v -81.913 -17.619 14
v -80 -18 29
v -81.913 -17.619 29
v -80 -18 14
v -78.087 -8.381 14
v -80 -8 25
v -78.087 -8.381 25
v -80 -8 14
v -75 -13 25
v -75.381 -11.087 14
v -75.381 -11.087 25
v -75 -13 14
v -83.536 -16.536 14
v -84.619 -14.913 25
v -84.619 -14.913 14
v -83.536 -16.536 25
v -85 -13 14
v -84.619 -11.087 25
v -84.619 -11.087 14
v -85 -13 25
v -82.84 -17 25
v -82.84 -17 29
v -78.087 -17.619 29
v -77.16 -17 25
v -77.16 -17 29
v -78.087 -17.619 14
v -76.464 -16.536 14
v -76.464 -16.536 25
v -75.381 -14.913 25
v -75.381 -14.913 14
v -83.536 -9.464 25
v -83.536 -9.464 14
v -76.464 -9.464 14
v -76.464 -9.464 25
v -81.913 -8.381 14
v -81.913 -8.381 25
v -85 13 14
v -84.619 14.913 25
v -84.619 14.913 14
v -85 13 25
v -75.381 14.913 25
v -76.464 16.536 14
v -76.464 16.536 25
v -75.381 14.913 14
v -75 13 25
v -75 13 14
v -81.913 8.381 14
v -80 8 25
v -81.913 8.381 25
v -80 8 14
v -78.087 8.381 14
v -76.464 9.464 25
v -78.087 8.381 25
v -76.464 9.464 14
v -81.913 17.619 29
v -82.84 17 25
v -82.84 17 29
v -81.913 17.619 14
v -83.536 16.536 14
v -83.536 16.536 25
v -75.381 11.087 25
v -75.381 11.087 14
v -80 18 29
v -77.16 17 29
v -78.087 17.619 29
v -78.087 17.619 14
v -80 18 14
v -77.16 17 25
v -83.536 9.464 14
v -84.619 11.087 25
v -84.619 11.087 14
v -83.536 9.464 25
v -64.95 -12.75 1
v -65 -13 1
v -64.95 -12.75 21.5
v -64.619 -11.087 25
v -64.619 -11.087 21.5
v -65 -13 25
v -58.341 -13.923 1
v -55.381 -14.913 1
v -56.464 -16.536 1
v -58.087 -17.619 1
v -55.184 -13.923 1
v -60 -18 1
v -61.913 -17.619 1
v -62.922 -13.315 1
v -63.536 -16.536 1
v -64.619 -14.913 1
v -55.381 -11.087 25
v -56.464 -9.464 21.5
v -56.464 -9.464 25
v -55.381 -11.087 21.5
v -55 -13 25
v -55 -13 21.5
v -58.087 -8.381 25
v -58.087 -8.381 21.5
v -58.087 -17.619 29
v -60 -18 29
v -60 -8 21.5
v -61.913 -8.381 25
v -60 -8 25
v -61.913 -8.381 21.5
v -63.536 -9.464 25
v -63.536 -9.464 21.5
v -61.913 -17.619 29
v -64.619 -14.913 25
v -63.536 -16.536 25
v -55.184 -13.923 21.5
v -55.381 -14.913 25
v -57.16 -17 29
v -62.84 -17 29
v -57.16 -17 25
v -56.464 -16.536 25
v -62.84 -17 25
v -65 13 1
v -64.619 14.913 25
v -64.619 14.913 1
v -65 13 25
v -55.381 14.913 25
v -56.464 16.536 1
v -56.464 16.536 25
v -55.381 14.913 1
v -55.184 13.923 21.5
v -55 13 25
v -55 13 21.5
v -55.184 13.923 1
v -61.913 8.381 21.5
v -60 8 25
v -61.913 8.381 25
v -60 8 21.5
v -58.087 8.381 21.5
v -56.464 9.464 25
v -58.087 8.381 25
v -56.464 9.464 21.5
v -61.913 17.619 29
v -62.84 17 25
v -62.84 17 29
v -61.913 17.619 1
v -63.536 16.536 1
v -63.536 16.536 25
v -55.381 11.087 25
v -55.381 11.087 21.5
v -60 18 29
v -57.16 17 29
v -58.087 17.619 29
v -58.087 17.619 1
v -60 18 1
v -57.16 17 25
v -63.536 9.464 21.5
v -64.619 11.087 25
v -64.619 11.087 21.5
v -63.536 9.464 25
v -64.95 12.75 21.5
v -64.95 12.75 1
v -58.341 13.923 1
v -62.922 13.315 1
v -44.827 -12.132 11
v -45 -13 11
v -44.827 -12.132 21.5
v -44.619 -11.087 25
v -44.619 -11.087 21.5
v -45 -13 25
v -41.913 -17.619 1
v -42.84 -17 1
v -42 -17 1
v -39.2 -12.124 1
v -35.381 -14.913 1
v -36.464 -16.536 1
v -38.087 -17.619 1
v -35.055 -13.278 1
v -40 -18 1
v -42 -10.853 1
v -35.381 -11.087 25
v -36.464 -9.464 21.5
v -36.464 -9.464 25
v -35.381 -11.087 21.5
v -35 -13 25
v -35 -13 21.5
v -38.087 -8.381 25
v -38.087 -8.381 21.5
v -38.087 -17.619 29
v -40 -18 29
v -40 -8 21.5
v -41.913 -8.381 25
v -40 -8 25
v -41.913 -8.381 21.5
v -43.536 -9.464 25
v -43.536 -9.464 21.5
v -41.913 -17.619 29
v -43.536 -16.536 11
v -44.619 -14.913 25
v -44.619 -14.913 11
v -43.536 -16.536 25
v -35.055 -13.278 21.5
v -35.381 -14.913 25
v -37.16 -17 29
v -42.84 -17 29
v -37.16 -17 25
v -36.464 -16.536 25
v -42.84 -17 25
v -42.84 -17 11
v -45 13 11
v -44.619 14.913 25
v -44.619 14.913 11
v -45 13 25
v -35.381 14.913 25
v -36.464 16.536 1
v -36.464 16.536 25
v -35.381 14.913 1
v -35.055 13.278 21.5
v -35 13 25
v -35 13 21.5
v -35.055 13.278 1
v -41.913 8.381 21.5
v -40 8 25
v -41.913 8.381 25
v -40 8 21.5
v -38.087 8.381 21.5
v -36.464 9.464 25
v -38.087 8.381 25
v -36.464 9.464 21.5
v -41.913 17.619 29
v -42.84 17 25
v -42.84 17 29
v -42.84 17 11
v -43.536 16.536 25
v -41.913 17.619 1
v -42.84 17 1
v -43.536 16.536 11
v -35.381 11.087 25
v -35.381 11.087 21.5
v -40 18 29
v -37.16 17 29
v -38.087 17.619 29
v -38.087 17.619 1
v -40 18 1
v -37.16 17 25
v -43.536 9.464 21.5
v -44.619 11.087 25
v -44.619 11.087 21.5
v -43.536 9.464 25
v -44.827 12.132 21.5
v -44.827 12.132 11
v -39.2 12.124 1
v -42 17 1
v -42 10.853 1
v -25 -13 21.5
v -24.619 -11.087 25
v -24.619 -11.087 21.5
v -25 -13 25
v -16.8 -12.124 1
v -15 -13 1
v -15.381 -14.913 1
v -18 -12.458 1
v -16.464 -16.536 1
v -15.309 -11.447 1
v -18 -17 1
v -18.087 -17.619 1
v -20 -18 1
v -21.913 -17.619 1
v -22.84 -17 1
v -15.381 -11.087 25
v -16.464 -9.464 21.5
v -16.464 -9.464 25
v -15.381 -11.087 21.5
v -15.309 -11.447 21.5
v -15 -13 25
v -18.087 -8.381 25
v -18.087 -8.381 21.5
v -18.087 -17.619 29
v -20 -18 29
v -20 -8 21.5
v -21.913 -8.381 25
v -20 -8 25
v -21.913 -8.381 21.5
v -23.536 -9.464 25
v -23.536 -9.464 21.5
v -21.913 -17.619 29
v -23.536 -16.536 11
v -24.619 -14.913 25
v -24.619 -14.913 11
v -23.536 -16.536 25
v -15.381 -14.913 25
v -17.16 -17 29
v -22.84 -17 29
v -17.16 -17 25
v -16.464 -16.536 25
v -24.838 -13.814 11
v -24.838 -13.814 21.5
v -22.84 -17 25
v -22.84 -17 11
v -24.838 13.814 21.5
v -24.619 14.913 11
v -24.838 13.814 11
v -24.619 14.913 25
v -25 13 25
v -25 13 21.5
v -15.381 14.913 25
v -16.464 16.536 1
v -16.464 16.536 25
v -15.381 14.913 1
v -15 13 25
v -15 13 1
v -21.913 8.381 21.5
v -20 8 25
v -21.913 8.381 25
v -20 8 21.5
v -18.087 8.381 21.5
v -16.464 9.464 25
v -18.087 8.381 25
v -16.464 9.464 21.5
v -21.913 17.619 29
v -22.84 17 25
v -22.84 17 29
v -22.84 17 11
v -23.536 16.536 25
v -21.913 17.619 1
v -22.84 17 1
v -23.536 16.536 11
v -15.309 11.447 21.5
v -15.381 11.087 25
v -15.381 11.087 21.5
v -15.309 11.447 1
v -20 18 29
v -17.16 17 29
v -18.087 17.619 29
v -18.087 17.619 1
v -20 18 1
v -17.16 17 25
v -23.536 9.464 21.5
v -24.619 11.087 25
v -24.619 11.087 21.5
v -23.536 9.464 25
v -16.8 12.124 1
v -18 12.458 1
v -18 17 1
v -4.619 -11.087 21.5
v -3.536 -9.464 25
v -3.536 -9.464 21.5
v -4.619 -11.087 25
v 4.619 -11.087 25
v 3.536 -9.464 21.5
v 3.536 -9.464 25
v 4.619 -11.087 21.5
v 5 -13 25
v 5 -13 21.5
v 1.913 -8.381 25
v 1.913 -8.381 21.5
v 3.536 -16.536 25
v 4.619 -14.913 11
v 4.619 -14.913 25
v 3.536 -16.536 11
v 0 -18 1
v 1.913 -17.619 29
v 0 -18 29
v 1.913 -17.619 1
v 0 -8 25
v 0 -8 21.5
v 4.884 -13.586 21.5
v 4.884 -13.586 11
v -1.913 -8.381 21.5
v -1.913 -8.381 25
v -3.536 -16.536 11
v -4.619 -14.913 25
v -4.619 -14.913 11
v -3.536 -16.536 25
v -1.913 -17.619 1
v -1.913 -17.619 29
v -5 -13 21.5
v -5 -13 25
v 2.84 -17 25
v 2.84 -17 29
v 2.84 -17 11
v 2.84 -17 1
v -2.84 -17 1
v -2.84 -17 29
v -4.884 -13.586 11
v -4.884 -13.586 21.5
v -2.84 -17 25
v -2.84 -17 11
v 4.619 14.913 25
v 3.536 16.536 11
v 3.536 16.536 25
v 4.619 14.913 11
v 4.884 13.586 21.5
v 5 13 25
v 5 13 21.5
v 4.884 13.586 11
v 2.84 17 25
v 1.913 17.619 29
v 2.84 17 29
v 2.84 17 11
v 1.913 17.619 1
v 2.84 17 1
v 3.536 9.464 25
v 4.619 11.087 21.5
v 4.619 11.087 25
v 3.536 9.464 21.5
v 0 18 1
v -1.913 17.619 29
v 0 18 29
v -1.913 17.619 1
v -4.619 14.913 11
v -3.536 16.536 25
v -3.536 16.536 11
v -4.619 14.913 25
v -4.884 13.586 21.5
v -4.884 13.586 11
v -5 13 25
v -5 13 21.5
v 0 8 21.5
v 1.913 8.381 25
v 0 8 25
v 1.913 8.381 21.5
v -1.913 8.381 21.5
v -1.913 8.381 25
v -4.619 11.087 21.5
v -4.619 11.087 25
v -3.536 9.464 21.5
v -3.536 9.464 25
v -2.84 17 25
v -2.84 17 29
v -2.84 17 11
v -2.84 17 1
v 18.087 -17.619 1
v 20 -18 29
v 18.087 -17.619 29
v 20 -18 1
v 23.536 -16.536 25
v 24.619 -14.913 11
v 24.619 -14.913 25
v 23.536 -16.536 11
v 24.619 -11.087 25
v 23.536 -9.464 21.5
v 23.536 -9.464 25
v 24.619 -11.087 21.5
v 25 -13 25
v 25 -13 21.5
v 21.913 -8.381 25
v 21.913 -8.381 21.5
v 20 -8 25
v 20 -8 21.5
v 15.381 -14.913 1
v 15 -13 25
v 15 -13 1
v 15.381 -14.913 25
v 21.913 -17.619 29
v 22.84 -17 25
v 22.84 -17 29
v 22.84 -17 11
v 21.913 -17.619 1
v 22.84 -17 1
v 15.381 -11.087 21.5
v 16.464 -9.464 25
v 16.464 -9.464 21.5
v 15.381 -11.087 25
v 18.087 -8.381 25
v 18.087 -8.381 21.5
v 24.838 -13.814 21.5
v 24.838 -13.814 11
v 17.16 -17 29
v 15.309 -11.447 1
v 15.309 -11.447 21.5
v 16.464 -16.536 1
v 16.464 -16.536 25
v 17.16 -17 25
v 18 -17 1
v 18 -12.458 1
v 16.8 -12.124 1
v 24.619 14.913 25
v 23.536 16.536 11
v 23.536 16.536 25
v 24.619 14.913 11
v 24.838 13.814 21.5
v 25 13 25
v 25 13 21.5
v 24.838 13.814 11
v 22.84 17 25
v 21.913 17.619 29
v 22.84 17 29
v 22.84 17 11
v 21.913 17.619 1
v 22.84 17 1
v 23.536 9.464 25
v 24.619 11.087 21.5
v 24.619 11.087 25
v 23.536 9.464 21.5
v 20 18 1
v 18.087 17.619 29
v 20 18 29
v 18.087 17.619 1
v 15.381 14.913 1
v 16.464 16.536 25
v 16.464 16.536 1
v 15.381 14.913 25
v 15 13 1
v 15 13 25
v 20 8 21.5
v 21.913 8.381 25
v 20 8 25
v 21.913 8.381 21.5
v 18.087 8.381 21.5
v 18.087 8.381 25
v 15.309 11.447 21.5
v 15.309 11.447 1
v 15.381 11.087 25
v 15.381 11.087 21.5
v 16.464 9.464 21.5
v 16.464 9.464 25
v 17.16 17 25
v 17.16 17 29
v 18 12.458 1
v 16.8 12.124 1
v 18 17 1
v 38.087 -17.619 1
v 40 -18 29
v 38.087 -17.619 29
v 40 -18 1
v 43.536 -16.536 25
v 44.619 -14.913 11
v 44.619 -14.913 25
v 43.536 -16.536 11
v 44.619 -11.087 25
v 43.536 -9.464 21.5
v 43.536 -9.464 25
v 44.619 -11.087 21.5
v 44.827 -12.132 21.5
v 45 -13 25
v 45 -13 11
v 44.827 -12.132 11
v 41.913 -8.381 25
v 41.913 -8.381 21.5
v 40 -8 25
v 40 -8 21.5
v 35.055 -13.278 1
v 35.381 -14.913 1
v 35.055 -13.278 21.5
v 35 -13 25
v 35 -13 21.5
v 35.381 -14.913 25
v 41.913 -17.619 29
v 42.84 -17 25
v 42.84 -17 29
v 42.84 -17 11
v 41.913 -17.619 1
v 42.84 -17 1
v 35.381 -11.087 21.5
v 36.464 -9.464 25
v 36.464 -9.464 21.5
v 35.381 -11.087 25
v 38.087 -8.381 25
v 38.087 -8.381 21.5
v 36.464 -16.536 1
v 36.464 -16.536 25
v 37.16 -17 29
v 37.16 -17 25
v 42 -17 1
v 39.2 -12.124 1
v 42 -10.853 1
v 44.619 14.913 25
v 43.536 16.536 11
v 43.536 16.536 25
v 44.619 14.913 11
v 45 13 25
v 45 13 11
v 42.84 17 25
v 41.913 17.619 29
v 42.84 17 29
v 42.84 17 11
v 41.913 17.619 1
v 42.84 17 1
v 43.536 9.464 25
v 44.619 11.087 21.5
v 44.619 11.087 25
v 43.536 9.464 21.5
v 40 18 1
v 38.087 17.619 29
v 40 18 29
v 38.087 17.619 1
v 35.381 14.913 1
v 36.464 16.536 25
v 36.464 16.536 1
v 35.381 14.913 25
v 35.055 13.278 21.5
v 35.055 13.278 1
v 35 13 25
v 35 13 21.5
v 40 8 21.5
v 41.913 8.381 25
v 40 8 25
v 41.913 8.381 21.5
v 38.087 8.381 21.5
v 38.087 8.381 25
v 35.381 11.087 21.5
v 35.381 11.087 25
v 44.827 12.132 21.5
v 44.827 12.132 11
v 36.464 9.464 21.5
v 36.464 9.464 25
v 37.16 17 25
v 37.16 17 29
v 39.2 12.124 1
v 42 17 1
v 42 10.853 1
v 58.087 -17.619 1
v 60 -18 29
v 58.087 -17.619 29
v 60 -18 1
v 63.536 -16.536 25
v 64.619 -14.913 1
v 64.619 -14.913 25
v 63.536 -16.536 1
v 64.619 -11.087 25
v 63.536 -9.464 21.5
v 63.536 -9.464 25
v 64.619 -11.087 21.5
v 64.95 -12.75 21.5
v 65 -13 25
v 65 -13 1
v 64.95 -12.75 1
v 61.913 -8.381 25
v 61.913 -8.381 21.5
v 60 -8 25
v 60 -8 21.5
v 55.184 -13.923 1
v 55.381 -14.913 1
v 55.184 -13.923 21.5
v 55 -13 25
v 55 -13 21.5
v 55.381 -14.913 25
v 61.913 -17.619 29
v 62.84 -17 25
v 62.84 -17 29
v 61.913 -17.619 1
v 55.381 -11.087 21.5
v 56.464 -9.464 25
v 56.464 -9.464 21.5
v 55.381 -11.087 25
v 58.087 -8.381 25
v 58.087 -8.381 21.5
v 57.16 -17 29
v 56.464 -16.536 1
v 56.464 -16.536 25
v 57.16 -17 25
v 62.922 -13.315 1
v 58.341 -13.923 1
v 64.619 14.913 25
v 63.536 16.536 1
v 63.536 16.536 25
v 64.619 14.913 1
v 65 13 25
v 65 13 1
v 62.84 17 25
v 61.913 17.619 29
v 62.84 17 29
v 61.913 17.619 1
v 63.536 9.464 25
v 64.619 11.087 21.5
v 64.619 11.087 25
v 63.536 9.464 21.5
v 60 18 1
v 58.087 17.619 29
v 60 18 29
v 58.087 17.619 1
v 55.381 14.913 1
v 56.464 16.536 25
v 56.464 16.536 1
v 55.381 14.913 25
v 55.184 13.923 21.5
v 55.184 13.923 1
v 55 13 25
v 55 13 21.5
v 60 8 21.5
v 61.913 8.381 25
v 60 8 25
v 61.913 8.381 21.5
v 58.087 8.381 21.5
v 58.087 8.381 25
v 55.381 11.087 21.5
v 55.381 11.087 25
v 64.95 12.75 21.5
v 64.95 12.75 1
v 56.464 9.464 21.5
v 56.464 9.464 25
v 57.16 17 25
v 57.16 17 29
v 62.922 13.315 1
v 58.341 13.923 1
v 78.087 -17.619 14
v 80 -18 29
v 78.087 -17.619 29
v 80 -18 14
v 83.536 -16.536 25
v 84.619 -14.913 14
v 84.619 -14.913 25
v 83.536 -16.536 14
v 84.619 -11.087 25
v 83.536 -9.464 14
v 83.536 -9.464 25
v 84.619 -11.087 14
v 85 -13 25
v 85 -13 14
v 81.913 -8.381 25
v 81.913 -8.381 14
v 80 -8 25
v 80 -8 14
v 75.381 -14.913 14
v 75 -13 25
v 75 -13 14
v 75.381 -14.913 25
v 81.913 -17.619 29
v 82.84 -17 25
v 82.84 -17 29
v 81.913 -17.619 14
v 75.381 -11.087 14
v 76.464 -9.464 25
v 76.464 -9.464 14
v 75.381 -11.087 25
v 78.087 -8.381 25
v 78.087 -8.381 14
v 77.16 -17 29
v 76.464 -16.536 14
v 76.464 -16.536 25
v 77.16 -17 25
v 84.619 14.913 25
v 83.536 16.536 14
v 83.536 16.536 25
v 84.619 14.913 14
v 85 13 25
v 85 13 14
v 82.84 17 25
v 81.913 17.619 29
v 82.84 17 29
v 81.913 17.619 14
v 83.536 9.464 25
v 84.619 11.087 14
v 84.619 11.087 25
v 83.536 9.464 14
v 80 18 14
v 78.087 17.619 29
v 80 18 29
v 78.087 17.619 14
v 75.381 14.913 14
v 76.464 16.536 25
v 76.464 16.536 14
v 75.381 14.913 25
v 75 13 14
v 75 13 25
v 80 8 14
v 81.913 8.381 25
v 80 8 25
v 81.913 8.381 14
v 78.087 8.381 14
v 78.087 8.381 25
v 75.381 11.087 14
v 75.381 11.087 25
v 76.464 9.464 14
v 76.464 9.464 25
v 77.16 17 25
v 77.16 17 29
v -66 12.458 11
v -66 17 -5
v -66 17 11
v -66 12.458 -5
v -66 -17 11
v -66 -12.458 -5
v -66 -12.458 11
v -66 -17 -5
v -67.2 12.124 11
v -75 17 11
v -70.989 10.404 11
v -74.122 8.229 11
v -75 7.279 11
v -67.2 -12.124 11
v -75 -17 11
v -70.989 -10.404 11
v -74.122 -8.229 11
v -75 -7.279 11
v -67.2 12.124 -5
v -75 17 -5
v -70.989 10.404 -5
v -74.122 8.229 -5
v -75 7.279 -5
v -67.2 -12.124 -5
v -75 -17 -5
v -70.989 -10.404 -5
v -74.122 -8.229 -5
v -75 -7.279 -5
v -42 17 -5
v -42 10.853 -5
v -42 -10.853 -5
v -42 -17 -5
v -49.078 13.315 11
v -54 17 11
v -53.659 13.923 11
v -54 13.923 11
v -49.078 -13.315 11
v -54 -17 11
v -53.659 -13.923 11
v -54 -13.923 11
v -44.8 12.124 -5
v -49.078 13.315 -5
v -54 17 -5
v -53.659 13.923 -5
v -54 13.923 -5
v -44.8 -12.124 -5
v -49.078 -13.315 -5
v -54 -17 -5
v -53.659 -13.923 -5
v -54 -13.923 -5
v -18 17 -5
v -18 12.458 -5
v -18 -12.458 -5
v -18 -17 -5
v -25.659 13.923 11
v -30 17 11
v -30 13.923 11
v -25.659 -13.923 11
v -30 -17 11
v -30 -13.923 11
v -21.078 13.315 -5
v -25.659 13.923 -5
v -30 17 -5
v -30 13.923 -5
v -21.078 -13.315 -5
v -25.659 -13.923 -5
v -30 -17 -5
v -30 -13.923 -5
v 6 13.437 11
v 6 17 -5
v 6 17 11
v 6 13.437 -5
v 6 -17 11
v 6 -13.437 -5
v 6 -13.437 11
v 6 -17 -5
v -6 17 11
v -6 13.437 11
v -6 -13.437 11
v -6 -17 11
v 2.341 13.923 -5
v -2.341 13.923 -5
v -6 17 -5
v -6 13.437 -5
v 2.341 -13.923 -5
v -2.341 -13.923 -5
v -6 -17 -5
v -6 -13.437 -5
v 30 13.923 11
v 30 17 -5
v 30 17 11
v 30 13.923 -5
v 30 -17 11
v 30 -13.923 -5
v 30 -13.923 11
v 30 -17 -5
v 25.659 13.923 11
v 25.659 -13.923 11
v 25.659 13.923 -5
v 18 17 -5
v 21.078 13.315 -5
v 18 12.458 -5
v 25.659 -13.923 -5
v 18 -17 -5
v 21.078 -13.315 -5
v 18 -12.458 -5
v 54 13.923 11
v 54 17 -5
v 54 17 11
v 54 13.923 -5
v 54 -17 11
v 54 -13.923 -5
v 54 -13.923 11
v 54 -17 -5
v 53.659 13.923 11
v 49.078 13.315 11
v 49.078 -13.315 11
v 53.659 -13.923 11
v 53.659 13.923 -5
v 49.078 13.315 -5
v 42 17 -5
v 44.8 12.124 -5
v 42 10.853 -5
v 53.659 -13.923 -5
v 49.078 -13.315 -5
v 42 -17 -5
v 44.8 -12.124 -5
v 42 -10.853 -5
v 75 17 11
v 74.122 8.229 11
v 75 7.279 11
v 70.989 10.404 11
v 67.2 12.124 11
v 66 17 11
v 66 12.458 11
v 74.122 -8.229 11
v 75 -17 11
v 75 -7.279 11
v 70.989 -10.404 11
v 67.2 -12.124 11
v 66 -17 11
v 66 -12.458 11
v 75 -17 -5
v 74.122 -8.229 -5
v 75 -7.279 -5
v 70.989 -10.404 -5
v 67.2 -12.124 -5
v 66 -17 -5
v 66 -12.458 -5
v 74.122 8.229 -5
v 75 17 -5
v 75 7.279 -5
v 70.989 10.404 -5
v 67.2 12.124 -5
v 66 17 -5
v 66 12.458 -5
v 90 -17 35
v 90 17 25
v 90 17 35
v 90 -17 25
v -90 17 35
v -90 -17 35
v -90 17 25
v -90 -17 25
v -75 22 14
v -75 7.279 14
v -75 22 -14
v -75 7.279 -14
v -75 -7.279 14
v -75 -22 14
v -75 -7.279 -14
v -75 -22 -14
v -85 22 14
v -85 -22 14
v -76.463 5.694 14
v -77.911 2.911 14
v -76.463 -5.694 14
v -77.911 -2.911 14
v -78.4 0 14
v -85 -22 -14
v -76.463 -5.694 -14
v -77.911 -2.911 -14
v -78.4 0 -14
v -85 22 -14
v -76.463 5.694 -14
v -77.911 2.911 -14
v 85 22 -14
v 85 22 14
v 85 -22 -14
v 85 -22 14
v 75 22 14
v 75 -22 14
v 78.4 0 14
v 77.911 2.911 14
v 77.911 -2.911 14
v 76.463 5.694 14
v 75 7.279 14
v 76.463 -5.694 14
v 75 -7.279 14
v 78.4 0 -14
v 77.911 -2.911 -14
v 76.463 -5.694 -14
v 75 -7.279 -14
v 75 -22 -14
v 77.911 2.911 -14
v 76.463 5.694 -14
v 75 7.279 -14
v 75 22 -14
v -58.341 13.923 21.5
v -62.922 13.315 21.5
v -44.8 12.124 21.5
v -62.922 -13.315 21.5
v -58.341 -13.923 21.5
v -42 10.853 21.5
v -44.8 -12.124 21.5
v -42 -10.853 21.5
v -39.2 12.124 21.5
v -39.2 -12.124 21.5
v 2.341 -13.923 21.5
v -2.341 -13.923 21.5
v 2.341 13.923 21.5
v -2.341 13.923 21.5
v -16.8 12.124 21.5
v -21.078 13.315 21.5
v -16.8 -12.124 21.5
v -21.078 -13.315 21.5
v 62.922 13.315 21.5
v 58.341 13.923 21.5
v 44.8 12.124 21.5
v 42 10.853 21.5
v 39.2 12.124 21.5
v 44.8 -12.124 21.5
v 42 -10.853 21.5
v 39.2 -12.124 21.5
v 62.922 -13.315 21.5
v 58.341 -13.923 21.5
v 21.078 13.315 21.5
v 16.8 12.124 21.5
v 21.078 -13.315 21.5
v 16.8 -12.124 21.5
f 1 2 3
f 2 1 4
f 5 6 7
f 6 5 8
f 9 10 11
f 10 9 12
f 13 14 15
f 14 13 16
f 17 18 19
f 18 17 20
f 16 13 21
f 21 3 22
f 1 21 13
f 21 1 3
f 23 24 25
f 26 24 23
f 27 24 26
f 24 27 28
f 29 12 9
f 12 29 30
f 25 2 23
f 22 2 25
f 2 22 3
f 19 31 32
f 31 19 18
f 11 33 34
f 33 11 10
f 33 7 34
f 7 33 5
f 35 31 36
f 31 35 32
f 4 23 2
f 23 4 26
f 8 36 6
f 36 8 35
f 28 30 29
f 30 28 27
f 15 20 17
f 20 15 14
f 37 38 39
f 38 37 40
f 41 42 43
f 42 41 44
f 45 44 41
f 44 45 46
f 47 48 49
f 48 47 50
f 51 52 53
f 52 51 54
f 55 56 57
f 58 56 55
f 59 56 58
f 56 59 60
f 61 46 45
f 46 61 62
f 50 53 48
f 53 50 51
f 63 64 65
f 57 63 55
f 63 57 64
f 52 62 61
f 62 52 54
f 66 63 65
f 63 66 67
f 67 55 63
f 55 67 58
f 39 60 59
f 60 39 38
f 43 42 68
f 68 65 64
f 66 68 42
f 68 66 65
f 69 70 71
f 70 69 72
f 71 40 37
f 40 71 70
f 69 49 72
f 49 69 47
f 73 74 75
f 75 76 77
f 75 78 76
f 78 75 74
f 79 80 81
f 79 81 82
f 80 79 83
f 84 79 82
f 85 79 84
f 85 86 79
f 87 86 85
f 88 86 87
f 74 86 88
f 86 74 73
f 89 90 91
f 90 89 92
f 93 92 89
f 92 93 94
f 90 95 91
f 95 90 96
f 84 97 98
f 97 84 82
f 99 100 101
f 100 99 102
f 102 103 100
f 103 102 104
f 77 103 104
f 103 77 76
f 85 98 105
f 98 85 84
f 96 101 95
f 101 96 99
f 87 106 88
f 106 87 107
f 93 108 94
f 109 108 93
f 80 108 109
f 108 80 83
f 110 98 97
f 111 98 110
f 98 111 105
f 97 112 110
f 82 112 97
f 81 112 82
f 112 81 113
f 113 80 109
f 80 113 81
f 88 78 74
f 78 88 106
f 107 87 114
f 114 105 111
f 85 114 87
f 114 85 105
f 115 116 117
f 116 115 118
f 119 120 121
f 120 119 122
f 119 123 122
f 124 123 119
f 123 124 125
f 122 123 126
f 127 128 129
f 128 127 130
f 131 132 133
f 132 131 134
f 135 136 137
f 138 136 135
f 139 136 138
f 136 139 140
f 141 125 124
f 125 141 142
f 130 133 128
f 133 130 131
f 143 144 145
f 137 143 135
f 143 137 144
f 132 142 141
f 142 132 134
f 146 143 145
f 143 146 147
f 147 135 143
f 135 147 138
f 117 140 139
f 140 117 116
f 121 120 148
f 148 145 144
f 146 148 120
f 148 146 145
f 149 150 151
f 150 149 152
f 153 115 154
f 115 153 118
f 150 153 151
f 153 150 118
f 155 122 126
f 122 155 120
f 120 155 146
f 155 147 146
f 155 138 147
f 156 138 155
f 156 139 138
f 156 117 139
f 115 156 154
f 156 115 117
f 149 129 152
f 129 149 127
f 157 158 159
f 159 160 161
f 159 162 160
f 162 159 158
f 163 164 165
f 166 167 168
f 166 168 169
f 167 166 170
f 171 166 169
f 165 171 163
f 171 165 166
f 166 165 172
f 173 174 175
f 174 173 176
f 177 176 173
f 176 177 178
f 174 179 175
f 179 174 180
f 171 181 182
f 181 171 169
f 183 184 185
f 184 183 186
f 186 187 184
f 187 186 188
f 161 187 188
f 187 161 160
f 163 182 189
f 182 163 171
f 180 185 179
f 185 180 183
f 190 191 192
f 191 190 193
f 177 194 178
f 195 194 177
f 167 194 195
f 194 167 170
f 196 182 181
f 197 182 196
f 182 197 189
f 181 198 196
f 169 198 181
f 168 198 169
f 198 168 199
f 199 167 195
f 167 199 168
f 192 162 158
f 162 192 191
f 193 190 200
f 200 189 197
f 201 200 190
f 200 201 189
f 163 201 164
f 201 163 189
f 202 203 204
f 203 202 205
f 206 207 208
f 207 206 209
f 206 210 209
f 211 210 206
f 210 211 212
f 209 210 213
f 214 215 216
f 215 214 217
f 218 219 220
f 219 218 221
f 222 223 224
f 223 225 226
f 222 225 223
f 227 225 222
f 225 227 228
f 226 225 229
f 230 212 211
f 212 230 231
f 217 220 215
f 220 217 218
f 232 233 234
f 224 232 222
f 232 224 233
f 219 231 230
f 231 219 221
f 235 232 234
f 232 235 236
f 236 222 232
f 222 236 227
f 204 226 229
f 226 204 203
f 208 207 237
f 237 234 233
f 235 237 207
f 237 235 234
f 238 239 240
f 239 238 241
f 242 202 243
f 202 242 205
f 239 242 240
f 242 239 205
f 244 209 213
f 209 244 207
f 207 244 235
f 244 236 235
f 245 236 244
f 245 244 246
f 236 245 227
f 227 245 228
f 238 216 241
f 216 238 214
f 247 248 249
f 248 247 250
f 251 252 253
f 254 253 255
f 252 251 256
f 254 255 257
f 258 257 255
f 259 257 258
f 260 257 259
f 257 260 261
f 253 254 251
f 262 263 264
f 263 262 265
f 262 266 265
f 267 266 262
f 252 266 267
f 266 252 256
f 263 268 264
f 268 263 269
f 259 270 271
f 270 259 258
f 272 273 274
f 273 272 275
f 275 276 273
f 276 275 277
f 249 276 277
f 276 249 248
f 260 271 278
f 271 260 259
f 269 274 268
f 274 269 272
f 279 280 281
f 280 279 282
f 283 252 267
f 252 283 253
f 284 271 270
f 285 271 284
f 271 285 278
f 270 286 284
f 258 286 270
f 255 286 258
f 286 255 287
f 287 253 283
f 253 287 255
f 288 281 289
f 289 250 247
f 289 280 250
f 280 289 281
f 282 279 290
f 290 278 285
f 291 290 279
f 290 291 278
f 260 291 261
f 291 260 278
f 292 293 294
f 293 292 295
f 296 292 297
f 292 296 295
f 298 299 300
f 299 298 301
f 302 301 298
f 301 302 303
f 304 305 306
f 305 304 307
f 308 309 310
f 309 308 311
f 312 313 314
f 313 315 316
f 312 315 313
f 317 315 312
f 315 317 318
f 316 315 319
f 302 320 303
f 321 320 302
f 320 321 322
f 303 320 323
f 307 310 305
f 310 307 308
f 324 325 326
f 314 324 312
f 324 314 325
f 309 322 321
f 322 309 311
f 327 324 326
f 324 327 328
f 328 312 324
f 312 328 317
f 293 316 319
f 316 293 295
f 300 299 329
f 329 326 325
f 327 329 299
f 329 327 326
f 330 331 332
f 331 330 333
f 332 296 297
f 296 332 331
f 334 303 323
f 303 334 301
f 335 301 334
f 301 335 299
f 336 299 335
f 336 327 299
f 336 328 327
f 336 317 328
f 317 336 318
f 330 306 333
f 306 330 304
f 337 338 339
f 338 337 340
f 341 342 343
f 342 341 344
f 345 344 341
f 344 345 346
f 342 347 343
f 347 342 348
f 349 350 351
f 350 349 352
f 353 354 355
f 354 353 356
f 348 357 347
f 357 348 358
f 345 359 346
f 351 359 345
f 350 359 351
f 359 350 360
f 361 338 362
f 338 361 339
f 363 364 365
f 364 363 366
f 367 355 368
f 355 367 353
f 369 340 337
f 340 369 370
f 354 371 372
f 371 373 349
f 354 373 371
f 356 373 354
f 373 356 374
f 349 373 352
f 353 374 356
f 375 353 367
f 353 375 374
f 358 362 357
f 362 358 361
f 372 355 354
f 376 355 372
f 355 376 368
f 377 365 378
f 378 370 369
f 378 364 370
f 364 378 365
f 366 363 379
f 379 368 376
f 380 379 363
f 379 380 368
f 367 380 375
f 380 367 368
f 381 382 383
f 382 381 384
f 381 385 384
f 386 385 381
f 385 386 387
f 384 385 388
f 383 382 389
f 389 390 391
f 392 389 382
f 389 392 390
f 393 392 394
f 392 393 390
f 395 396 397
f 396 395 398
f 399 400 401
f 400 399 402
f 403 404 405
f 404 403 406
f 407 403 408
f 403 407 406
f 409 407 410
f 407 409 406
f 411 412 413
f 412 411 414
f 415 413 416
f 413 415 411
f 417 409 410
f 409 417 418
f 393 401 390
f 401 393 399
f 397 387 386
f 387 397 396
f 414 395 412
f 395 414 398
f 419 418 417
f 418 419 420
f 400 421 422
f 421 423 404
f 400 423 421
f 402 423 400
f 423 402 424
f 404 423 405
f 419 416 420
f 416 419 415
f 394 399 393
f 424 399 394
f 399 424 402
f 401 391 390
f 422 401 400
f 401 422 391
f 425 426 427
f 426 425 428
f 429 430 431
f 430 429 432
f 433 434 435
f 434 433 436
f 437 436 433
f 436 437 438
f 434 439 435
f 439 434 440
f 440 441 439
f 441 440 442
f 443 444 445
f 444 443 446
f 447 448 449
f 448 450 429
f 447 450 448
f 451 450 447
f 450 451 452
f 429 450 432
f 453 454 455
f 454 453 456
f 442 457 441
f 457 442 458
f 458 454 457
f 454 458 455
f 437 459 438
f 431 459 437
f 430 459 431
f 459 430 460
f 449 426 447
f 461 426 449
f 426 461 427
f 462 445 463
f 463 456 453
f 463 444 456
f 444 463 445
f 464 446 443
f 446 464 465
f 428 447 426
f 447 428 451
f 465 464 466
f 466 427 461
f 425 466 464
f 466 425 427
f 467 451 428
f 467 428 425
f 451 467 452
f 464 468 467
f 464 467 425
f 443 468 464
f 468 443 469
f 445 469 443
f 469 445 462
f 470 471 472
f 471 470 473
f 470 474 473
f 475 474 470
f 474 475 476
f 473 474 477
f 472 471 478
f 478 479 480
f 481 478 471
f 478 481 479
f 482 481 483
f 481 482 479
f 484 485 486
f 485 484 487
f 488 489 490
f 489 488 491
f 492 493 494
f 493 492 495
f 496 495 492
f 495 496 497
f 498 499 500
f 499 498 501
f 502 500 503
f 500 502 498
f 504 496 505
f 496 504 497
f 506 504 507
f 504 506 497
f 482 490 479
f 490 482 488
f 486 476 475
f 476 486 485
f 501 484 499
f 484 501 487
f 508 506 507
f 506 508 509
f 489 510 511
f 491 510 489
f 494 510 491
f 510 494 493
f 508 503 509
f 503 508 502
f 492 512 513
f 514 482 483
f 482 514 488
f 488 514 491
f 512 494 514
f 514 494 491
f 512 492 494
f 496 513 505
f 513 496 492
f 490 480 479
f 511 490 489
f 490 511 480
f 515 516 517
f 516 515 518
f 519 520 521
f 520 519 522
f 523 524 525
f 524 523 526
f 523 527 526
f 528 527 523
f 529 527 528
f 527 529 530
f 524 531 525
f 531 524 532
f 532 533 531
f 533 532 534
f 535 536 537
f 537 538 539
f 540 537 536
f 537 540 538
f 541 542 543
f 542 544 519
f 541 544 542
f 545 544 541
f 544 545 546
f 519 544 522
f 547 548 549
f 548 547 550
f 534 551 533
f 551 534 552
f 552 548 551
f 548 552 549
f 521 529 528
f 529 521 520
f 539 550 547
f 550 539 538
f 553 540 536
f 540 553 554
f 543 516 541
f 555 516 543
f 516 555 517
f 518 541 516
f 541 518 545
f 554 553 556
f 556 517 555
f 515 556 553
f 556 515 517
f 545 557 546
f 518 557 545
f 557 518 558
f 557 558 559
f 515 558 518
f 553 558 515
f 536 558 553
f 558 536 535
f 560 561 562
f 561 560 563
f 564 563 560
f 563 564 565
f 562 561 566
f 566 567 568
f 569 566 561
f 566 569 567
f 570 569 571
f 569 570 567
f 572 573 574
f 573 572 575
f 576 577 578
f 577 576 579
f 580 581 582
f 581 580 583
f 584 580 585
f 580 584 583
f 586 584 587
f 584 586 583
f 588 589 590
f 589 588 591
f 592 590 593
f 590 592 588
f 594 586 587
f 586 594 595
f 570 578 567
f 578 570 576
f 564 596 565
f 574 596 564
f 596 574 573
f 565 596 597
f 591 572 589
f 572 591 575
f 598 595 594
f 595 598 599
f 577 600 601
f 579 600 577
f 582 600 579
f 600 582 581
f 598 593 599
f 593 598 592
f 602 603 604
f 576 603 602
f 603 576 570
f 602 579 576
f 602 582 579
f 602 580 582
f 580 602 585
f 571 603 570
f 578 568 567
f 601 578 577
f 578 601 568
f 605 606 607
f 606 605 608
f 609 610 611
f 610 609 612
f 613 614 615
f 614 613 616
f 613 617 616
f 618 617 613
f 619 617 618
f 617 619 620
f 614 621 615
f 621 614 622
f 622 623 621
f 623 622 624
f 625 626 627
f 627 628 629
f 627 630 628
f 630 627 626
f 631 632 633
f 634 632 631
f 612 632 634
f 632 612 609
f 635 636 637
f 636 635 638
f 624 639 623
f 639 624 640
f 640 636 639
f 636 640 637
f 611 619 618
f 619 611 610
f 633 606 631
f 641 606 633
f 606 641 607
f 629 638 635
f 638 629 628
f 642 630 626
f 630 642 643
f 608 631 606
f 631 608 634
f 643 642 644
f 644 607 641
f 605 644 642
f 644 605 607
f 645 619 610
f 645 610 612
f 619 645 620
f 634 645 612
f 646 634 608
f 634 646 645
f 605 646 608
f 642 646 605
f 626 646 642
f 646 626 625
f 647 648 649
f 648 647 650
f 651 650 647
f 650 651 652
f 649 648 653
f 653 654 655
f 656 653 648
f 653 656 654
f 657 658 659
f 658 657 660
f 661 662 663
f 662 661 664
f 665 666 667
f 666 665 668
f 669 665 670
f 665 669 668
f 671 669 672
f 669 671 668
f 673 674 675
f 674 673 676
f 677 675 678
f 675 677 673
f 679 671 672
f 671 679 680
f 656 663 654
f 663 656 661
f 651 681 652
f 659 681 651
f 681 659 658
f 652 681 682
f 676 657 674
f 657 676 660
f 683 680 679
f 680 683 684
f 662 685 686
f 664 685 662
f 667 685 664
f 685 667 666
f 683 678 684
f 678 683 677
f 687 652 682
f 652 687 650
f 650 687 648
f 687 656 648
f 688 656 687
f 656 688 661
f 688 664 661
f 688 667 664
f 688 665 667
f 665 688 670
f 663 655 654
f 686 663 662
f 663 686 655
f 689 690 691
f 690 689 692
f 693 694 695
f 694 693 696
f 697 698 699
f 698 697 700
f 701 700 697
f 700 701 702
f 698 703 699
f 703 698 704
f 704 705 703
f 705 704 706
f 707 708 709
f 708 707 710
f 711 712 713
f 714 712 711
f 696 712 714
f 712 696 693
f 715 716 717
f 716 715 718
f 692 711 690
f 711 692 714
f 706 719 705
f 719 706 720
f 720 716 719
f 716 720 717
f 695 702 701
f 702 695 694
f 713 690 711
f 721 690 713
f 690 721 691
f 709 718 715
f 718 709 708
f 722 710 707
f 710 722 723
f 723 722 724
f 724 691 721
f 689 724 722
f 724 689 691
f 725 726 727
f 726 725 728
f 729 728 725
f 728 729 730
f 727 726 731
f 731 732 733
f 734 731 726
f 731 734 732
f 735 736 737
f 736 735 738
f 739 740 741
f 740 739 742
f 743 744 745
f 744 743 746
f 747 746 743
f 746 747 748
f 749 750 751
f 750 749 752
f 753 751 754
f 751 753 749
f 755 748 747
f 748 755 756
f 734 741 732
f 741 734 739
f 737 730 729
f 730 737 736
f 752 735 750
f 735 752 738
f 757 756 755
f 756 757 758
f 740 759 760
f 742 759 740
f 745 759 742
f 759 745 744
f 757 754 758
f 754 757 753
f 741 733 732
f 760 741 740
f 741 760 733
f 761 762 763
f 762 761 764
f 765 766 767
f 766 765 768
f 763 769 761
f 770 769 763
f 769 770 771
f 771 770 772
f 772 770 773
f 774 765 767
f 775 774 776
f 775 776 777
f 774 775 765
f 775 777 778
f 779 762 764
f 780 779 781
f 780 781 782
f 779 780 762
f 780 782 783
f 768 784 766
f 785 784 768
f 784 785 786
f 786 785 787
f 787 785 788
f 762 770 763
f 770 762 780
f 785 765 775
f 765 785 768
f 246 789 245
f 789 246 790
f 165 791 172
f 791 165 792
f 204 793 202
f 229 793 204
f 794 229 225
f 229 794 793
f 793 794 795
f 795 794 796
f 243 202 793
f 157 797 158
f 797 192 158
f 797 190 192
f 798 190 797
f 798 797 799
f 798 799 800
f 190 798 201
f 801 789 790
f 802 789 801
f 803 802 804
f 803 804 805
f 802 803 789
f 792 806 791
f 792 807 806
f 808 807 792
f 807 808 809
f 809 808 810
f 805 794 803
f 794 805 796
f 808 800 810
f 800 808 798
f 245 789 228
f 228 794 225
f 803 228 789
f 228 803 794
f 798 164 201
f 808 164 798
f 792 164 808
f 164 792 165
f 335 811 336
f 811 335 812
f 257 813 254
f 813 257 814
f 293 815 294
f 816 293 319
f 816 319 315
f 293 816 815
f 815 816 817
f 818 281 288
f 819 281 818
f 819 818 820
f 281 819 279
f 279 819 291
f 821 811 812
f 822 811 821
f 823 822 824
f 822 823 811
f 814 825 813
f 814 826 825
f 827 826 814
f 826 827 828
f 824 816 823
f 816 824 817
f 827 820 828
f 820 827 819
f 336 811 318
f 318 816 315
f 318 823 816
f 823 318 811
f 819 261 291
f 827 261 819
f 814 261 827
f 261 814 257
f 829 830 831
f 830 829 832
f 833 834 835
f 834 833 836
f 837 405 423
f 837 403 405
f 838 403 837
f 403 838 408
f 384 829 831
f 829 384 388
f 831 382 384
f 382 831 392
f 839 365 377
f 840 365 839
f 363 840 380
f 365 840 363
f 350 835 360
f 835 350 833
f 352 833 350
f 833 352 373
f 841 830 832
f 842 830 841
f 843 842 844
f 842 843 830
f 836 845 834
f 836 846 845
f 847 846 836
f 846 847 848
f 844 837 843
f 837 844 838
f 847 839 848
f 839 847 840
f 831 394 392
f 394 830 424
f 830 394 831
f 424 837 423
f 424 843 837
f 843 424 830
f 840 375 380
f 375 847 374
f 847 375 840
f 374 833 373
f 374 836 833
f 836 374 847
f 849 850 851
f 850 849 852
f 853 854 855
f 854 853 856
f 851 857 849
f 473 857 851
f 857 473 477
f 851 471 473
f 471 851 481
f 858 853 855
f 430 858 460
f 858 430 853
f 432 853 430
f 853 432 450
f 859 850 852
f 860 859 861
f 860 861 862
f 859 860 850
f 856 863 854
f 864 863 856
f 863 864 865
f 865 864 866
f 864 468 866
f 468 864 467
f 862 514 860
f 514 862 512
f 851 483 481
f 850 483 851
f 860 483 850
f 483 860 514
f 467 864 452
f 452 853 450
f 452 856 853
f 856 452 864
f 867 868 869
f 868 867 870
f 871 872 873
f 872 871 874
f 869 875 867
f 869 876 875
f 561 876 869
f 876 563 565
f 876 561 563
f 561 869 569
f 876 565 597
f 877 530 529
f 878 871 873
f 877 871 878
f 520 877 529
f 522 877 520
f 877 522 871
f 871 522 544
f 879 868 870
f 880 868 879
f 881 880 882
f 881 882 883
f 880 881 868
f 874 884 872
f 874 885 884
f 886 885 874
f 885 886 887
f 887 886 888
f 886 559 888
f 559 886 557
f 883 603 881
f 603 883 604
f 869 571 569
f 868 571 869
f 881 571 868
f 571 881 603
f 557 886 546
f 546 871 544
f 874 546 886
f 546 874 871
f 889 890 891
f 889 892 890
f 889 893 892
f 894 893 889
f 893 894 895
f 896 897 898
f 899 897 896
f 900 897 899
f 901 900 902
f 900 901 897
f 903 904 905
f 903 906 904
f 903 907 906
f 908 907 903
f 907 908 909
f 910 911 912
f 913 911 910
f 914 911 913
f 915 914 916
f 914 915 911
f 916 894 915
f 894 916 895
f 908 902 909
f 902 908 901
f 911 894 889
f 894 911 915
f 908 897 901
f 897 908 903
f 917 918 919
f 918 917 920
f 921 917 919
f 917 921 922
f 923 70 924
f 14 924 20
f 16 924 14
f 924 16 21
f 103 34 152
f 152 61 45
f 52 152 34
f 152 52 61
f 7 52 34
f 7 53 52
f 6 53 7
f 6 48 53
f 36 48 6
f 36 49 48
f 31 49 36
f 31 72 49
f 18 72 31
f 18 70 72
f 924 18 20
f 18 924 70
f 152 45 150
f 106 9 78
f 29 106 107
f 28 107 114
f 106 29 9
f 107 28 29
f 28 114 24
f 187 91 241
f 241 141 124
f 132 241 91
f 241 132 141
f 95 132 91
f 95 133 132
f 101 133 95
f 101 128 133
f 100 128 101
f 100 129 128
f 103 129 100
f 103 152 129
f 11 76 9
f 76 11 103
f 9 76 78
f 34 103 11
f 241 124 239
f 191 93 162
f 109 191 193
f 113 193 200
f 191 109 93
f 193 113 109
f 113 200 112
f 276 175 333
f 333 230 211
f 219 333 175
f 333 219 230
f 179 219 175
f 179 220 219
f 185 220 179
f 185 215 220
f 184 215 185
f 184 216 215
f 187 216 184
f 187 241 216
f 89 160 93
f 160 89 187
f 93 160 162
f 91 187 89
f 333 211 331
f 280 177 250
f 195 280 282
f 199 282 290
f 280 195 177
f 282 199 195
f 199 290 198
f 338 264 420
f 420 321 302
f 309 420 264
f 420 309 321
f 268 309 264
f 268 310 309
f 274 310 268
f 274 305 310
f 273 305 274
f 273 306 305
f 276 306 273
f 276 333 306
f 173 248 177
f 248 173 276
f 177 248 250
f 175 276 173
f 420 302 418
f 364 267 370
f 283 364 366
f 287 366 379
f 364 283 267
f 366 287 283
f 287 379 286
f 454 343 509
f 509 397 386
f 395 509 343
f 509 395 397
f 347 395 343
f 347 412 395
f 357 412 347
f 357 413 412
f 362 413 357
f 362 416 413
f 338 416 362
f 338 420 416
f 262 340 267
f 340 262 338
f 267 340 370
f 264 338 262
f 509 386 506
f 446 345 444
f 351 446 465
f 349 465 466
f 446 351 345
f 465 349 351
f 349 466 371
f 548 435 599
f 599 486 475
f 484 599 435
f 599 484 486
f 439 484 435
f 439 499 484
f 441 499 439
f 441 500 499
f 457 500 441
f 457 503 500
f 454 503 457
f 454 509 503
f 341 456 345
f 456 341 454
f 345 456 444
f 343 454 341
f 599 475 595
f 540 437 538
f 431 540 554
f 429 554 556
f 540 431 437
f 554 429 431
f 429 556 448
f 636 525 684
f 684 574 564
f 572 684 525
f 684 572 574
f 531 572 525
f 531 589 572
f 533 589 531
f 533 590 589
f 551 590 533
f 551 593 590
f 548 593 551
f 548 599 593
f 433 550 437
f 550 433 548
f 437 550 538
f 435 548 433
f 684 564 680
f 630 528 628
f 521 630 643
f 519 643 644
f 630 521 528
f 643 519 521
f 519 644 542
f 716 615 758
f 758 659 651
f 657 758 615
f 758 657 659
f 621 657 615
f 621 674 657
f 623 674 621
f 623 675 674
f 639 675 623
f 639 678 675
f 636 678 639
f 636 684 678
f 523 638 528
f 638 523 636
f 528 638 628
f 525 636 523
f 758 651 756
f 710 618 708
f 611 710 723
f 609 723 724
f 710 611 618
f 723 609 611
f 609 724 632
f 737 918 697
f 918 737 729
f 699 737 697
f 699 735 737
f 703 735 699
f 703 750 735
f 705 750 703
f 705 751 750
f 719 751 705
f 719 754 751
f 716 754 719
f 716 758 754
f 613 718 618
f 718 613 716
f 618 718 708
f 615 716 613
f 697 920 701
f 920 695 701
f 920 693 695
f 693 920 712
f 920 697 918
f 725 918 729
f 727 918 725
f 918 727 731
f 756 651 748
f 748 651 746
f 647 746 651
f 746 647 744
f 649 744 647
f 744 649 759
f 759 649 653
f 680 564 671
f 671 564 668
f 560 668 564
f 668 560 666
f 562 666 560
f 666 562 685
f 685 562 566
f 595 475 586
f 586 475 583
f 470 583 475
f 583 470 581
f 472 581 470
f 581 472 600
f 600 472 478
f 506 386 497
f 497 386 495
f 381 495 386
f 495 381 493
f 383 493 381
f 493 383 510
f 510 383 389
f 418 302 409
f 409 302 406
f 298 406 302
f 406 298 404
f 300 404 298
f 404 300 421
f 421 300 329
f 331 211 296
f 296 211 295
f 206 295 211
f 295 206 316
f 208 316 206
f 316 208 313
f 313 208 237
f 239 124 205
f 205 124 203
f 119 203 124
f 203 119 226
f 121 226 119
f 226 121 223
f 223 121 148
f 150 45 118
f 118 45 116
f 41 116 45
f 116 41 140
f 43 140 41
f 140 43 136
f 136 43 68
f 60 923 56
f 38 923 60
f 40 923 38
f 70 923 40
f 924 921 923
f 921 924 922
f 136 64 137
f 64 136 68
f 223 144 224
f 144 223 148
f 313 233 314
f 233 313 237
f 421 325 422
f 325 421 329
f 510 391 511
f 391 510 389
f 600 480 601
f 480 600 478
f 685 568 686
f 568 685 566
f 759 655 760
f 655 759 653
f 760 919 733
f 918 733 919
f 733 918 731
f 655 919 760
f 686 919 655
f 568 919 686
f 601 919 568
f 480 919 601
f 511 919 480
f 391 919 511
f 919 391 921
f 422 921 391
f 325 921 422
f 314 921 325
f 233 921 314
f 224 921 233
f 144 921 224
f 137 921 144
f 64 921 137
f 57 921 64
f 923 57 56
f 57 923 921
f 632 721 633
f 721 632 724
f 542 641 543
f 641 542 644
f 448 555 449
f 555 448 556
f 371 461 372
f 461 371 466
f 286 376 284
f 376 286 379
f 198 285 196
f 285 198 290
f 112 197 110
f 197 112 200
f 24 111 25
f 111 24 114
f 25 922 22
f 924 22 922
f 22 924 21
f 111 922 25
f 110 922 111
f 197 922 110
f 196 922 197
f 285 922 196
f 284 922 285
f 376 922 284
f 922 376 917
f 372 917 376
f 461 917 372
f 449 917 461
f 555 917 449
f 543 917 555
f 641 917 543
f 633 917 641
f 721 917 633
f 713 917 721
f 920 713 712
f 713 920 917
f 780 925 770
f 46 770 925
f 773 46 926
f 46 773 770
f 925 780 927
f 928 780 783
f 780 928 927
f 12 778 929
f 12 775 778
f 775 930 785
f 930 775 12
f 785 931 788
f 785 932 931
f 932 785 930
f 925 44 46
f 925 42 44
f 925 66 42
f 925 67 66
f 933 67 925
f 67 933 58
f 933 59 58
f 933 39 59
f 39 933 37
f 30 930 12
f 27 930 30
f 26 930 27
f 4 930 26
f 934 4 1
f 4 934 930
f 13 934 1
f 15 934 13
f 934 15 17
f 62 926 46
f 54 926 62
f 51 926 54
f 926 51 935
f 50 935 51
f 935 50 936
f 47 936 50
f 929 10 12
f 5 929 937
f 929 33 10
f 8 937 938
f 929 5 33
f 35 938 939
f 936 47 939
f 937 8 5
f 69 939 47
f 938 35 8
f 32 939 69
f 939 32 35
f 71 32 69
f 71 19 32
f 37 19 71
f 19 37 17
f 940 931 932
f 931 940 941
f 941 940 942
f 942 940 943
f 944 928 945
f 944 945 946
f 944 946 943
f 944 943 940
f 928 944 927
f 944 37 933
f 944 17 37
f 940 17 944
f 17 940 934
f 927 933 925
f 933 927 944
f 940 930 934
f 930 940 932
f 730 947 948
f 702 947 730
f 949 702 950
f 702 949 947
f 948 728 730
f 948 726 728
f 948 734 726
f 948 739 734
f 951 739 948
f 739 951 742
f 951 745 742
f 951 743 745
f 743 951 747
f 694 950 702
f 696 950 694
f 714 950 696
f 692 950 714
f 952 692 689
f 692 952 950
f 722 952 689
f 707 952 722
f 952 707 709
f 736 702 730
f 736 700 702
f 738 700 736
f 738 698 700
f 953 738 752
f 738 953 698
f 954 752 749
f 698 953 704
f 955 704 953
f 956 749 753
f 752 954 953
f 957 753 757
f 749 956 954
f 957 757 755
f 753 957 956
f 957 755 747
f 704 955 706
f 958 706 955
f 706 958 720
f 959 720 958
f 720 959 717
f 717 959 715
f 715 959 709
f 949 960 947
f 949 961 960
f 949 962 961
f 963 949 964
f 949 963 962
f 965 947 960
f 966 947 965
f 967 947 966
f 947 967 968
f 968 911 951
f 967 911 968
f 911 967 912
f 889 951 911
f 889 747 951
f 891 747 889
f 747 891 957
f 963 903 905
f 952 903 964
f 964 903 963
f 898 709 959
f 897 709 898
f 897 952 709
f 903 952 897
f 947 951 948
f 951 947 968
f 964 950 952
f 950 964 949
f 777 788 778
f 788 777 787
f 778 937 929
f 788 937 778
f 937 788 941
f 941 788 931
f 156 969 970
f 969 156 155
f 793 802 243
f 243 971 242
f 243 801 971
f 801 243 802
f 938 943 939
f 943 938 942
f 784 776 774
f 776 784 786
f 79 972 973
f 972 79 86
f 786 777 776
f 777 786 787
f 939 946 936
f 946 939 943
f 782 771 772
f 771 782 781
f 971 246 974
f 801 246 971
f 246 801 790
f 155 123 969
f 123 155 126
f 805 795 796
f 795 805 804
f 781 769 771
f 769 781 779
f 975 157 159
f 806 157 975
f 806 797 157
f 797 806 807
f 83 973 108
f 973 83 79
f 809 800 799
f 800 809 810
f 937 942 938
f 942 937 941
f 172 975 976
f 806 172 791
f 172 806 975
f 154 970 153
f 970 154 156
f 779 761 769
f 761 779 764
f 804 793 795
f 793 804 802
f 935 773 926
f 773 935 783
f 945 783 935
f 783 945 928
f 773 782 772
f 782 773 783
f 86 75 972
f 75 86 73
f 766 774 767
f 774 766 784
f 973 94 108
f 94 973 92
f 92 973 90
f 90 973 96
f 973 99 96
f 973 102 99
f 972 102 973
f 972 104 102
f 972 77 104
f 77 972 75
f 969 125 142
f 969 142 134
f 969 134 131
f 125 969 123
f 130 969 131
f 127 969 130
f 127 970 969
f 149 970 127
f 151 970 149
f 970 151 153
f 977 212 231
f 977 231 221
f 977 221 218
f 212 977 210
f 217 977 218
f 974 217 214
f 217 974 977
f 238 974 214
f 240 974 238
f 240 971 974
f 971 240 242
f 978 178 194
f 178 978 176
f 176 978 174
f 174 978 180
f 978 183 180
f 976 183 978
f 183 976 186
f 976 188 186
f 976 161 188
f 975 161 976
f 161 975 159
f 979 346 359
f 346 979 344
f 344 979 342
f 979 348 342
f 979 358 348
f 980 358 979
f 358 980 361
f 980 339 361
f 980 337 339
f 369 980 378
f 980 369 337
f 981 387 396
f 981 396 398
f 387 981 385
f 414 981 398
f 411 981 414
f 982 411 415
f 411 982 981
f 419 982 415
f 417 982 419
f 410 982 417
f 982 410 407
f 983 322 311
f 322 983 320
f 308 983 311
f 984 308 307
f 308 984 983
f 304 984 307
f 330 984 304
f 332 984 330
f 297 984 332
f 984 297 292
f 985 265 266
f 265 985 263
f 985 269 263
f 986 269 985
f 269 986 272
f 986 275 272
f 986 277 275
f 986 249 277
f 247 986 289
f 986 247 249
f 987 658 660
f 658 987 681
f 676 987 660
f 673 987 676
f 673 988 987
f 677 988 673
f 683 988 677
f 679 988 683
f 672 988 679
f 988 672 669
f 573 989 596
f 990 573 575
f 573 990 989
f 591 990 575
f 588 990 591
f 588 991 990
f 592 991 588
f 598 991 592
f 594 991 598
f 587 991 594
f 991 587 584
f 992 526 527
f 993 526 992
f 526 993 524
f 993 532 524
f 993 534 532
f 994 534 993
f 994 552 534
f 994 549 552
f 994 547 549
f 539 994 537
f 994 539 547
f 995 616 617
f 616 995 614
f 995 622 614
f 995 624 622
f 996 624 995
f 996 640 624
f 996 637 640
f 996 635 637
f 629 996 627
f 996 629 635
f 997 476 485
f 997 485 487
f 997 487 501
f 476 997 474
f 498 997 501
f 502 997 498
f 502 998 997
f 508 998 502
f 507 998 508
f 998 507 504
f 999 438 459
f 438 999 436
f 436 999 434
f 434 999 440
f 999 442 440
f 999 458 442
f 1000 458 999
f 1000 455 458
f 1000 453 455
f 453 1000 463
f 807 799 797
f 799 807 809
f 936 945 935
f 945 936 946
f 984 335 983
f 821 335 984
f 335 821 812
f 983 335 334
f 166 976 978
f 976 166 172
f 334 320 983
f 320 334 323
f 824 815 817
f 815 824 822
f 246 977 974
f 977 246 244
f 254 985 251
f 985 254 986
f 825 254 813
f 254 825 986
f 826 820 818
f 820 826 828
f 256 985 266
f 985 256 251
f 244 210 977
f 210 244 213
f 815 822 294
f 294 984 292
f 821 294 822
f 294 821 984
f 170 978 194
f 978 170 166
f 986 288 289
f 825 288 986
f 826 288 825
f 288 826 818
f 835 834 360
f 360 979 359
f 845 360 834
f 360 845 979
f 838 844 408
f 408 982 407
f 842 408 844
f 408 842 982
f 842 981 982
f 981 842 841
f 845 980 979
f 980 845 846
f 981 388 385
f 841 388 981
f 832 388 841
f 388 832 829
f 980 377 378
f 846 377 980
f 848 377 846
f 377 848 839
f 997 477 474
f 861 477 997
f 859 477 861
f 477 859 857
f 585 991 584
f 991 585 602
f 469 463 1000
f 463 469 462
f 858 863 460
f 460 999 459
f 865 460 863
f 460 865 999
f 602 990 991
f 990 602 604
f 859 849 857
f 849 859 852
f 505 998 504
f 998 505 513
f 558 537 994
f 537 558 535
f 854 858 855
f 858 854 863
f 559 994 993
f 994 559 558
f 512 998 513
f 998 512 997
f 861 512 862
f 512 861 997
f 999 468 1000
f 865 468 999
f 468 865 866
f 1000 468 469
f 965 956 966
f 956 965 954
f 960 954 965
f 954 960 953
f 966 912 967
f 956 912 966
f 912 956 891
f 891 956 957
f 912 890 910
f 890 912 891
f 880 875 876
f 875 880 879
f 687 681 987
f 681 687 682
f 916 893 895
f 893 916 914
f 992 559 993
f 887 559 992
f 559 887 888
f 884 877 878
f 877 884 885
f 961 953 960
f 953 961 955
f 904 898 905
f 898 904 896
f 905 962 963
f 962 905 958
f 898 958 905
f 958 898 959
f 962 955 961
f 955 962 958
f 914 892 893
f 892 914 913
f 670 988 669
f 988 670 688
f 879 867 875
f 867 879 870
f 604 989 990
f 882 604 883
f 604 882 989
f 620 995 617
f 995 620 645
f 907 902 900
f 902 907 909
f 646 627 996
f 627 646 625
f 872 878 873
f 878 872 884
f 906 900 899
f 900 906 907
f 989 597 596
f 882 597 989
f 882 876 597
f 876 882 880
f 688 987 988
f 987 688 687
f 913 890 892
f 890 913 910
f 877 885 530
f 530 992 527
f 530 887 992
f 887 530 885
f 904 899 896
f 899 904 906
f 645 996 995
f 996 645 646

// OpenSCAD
// 3DScad sample: arched bridge
// Uses only the currently round-trippable subset.

module scene_model() {
    deck_length = 180;
    deck_width = 34;
    deck_height = 10;

    difference() {
        union() {
            translate([0, 0, 30]) {
                cube([deck_length, deck_width, deck_height], center=true);
            }

            for (i = [-4 : 1 : 4]) {
                translate([i*20, -13, 15]) {
                    cylinder(h=28, r=5, center=true);
                }
                translate([i*20, 13, 15]) {
                    cylinder(h=28, r=5, center=true);
                }
            }

            for (i = [-3 : 1 : 3]) {
                translate([i*24, 0, 3]) {
                    cube([12, deck_width, 16], center=true);
                }
            }

            translate([-80, 0, 0]) {
                cube([10, deck_width + 10, 28], center=true);
            }
            translate([80, 0, 0]) {
                cube([10, deck_width + 10, 28], center=true);
            }
        }

        for (i = [-2 : 1 : 2]) {
            translate([i*28, 0, 2]) {
                scale([1.6, 1, 0.75]) {
                    cylinder(h=deck_width + 18, r=14, center=true);
                }
            }
        }
    }
}

scene_model();
